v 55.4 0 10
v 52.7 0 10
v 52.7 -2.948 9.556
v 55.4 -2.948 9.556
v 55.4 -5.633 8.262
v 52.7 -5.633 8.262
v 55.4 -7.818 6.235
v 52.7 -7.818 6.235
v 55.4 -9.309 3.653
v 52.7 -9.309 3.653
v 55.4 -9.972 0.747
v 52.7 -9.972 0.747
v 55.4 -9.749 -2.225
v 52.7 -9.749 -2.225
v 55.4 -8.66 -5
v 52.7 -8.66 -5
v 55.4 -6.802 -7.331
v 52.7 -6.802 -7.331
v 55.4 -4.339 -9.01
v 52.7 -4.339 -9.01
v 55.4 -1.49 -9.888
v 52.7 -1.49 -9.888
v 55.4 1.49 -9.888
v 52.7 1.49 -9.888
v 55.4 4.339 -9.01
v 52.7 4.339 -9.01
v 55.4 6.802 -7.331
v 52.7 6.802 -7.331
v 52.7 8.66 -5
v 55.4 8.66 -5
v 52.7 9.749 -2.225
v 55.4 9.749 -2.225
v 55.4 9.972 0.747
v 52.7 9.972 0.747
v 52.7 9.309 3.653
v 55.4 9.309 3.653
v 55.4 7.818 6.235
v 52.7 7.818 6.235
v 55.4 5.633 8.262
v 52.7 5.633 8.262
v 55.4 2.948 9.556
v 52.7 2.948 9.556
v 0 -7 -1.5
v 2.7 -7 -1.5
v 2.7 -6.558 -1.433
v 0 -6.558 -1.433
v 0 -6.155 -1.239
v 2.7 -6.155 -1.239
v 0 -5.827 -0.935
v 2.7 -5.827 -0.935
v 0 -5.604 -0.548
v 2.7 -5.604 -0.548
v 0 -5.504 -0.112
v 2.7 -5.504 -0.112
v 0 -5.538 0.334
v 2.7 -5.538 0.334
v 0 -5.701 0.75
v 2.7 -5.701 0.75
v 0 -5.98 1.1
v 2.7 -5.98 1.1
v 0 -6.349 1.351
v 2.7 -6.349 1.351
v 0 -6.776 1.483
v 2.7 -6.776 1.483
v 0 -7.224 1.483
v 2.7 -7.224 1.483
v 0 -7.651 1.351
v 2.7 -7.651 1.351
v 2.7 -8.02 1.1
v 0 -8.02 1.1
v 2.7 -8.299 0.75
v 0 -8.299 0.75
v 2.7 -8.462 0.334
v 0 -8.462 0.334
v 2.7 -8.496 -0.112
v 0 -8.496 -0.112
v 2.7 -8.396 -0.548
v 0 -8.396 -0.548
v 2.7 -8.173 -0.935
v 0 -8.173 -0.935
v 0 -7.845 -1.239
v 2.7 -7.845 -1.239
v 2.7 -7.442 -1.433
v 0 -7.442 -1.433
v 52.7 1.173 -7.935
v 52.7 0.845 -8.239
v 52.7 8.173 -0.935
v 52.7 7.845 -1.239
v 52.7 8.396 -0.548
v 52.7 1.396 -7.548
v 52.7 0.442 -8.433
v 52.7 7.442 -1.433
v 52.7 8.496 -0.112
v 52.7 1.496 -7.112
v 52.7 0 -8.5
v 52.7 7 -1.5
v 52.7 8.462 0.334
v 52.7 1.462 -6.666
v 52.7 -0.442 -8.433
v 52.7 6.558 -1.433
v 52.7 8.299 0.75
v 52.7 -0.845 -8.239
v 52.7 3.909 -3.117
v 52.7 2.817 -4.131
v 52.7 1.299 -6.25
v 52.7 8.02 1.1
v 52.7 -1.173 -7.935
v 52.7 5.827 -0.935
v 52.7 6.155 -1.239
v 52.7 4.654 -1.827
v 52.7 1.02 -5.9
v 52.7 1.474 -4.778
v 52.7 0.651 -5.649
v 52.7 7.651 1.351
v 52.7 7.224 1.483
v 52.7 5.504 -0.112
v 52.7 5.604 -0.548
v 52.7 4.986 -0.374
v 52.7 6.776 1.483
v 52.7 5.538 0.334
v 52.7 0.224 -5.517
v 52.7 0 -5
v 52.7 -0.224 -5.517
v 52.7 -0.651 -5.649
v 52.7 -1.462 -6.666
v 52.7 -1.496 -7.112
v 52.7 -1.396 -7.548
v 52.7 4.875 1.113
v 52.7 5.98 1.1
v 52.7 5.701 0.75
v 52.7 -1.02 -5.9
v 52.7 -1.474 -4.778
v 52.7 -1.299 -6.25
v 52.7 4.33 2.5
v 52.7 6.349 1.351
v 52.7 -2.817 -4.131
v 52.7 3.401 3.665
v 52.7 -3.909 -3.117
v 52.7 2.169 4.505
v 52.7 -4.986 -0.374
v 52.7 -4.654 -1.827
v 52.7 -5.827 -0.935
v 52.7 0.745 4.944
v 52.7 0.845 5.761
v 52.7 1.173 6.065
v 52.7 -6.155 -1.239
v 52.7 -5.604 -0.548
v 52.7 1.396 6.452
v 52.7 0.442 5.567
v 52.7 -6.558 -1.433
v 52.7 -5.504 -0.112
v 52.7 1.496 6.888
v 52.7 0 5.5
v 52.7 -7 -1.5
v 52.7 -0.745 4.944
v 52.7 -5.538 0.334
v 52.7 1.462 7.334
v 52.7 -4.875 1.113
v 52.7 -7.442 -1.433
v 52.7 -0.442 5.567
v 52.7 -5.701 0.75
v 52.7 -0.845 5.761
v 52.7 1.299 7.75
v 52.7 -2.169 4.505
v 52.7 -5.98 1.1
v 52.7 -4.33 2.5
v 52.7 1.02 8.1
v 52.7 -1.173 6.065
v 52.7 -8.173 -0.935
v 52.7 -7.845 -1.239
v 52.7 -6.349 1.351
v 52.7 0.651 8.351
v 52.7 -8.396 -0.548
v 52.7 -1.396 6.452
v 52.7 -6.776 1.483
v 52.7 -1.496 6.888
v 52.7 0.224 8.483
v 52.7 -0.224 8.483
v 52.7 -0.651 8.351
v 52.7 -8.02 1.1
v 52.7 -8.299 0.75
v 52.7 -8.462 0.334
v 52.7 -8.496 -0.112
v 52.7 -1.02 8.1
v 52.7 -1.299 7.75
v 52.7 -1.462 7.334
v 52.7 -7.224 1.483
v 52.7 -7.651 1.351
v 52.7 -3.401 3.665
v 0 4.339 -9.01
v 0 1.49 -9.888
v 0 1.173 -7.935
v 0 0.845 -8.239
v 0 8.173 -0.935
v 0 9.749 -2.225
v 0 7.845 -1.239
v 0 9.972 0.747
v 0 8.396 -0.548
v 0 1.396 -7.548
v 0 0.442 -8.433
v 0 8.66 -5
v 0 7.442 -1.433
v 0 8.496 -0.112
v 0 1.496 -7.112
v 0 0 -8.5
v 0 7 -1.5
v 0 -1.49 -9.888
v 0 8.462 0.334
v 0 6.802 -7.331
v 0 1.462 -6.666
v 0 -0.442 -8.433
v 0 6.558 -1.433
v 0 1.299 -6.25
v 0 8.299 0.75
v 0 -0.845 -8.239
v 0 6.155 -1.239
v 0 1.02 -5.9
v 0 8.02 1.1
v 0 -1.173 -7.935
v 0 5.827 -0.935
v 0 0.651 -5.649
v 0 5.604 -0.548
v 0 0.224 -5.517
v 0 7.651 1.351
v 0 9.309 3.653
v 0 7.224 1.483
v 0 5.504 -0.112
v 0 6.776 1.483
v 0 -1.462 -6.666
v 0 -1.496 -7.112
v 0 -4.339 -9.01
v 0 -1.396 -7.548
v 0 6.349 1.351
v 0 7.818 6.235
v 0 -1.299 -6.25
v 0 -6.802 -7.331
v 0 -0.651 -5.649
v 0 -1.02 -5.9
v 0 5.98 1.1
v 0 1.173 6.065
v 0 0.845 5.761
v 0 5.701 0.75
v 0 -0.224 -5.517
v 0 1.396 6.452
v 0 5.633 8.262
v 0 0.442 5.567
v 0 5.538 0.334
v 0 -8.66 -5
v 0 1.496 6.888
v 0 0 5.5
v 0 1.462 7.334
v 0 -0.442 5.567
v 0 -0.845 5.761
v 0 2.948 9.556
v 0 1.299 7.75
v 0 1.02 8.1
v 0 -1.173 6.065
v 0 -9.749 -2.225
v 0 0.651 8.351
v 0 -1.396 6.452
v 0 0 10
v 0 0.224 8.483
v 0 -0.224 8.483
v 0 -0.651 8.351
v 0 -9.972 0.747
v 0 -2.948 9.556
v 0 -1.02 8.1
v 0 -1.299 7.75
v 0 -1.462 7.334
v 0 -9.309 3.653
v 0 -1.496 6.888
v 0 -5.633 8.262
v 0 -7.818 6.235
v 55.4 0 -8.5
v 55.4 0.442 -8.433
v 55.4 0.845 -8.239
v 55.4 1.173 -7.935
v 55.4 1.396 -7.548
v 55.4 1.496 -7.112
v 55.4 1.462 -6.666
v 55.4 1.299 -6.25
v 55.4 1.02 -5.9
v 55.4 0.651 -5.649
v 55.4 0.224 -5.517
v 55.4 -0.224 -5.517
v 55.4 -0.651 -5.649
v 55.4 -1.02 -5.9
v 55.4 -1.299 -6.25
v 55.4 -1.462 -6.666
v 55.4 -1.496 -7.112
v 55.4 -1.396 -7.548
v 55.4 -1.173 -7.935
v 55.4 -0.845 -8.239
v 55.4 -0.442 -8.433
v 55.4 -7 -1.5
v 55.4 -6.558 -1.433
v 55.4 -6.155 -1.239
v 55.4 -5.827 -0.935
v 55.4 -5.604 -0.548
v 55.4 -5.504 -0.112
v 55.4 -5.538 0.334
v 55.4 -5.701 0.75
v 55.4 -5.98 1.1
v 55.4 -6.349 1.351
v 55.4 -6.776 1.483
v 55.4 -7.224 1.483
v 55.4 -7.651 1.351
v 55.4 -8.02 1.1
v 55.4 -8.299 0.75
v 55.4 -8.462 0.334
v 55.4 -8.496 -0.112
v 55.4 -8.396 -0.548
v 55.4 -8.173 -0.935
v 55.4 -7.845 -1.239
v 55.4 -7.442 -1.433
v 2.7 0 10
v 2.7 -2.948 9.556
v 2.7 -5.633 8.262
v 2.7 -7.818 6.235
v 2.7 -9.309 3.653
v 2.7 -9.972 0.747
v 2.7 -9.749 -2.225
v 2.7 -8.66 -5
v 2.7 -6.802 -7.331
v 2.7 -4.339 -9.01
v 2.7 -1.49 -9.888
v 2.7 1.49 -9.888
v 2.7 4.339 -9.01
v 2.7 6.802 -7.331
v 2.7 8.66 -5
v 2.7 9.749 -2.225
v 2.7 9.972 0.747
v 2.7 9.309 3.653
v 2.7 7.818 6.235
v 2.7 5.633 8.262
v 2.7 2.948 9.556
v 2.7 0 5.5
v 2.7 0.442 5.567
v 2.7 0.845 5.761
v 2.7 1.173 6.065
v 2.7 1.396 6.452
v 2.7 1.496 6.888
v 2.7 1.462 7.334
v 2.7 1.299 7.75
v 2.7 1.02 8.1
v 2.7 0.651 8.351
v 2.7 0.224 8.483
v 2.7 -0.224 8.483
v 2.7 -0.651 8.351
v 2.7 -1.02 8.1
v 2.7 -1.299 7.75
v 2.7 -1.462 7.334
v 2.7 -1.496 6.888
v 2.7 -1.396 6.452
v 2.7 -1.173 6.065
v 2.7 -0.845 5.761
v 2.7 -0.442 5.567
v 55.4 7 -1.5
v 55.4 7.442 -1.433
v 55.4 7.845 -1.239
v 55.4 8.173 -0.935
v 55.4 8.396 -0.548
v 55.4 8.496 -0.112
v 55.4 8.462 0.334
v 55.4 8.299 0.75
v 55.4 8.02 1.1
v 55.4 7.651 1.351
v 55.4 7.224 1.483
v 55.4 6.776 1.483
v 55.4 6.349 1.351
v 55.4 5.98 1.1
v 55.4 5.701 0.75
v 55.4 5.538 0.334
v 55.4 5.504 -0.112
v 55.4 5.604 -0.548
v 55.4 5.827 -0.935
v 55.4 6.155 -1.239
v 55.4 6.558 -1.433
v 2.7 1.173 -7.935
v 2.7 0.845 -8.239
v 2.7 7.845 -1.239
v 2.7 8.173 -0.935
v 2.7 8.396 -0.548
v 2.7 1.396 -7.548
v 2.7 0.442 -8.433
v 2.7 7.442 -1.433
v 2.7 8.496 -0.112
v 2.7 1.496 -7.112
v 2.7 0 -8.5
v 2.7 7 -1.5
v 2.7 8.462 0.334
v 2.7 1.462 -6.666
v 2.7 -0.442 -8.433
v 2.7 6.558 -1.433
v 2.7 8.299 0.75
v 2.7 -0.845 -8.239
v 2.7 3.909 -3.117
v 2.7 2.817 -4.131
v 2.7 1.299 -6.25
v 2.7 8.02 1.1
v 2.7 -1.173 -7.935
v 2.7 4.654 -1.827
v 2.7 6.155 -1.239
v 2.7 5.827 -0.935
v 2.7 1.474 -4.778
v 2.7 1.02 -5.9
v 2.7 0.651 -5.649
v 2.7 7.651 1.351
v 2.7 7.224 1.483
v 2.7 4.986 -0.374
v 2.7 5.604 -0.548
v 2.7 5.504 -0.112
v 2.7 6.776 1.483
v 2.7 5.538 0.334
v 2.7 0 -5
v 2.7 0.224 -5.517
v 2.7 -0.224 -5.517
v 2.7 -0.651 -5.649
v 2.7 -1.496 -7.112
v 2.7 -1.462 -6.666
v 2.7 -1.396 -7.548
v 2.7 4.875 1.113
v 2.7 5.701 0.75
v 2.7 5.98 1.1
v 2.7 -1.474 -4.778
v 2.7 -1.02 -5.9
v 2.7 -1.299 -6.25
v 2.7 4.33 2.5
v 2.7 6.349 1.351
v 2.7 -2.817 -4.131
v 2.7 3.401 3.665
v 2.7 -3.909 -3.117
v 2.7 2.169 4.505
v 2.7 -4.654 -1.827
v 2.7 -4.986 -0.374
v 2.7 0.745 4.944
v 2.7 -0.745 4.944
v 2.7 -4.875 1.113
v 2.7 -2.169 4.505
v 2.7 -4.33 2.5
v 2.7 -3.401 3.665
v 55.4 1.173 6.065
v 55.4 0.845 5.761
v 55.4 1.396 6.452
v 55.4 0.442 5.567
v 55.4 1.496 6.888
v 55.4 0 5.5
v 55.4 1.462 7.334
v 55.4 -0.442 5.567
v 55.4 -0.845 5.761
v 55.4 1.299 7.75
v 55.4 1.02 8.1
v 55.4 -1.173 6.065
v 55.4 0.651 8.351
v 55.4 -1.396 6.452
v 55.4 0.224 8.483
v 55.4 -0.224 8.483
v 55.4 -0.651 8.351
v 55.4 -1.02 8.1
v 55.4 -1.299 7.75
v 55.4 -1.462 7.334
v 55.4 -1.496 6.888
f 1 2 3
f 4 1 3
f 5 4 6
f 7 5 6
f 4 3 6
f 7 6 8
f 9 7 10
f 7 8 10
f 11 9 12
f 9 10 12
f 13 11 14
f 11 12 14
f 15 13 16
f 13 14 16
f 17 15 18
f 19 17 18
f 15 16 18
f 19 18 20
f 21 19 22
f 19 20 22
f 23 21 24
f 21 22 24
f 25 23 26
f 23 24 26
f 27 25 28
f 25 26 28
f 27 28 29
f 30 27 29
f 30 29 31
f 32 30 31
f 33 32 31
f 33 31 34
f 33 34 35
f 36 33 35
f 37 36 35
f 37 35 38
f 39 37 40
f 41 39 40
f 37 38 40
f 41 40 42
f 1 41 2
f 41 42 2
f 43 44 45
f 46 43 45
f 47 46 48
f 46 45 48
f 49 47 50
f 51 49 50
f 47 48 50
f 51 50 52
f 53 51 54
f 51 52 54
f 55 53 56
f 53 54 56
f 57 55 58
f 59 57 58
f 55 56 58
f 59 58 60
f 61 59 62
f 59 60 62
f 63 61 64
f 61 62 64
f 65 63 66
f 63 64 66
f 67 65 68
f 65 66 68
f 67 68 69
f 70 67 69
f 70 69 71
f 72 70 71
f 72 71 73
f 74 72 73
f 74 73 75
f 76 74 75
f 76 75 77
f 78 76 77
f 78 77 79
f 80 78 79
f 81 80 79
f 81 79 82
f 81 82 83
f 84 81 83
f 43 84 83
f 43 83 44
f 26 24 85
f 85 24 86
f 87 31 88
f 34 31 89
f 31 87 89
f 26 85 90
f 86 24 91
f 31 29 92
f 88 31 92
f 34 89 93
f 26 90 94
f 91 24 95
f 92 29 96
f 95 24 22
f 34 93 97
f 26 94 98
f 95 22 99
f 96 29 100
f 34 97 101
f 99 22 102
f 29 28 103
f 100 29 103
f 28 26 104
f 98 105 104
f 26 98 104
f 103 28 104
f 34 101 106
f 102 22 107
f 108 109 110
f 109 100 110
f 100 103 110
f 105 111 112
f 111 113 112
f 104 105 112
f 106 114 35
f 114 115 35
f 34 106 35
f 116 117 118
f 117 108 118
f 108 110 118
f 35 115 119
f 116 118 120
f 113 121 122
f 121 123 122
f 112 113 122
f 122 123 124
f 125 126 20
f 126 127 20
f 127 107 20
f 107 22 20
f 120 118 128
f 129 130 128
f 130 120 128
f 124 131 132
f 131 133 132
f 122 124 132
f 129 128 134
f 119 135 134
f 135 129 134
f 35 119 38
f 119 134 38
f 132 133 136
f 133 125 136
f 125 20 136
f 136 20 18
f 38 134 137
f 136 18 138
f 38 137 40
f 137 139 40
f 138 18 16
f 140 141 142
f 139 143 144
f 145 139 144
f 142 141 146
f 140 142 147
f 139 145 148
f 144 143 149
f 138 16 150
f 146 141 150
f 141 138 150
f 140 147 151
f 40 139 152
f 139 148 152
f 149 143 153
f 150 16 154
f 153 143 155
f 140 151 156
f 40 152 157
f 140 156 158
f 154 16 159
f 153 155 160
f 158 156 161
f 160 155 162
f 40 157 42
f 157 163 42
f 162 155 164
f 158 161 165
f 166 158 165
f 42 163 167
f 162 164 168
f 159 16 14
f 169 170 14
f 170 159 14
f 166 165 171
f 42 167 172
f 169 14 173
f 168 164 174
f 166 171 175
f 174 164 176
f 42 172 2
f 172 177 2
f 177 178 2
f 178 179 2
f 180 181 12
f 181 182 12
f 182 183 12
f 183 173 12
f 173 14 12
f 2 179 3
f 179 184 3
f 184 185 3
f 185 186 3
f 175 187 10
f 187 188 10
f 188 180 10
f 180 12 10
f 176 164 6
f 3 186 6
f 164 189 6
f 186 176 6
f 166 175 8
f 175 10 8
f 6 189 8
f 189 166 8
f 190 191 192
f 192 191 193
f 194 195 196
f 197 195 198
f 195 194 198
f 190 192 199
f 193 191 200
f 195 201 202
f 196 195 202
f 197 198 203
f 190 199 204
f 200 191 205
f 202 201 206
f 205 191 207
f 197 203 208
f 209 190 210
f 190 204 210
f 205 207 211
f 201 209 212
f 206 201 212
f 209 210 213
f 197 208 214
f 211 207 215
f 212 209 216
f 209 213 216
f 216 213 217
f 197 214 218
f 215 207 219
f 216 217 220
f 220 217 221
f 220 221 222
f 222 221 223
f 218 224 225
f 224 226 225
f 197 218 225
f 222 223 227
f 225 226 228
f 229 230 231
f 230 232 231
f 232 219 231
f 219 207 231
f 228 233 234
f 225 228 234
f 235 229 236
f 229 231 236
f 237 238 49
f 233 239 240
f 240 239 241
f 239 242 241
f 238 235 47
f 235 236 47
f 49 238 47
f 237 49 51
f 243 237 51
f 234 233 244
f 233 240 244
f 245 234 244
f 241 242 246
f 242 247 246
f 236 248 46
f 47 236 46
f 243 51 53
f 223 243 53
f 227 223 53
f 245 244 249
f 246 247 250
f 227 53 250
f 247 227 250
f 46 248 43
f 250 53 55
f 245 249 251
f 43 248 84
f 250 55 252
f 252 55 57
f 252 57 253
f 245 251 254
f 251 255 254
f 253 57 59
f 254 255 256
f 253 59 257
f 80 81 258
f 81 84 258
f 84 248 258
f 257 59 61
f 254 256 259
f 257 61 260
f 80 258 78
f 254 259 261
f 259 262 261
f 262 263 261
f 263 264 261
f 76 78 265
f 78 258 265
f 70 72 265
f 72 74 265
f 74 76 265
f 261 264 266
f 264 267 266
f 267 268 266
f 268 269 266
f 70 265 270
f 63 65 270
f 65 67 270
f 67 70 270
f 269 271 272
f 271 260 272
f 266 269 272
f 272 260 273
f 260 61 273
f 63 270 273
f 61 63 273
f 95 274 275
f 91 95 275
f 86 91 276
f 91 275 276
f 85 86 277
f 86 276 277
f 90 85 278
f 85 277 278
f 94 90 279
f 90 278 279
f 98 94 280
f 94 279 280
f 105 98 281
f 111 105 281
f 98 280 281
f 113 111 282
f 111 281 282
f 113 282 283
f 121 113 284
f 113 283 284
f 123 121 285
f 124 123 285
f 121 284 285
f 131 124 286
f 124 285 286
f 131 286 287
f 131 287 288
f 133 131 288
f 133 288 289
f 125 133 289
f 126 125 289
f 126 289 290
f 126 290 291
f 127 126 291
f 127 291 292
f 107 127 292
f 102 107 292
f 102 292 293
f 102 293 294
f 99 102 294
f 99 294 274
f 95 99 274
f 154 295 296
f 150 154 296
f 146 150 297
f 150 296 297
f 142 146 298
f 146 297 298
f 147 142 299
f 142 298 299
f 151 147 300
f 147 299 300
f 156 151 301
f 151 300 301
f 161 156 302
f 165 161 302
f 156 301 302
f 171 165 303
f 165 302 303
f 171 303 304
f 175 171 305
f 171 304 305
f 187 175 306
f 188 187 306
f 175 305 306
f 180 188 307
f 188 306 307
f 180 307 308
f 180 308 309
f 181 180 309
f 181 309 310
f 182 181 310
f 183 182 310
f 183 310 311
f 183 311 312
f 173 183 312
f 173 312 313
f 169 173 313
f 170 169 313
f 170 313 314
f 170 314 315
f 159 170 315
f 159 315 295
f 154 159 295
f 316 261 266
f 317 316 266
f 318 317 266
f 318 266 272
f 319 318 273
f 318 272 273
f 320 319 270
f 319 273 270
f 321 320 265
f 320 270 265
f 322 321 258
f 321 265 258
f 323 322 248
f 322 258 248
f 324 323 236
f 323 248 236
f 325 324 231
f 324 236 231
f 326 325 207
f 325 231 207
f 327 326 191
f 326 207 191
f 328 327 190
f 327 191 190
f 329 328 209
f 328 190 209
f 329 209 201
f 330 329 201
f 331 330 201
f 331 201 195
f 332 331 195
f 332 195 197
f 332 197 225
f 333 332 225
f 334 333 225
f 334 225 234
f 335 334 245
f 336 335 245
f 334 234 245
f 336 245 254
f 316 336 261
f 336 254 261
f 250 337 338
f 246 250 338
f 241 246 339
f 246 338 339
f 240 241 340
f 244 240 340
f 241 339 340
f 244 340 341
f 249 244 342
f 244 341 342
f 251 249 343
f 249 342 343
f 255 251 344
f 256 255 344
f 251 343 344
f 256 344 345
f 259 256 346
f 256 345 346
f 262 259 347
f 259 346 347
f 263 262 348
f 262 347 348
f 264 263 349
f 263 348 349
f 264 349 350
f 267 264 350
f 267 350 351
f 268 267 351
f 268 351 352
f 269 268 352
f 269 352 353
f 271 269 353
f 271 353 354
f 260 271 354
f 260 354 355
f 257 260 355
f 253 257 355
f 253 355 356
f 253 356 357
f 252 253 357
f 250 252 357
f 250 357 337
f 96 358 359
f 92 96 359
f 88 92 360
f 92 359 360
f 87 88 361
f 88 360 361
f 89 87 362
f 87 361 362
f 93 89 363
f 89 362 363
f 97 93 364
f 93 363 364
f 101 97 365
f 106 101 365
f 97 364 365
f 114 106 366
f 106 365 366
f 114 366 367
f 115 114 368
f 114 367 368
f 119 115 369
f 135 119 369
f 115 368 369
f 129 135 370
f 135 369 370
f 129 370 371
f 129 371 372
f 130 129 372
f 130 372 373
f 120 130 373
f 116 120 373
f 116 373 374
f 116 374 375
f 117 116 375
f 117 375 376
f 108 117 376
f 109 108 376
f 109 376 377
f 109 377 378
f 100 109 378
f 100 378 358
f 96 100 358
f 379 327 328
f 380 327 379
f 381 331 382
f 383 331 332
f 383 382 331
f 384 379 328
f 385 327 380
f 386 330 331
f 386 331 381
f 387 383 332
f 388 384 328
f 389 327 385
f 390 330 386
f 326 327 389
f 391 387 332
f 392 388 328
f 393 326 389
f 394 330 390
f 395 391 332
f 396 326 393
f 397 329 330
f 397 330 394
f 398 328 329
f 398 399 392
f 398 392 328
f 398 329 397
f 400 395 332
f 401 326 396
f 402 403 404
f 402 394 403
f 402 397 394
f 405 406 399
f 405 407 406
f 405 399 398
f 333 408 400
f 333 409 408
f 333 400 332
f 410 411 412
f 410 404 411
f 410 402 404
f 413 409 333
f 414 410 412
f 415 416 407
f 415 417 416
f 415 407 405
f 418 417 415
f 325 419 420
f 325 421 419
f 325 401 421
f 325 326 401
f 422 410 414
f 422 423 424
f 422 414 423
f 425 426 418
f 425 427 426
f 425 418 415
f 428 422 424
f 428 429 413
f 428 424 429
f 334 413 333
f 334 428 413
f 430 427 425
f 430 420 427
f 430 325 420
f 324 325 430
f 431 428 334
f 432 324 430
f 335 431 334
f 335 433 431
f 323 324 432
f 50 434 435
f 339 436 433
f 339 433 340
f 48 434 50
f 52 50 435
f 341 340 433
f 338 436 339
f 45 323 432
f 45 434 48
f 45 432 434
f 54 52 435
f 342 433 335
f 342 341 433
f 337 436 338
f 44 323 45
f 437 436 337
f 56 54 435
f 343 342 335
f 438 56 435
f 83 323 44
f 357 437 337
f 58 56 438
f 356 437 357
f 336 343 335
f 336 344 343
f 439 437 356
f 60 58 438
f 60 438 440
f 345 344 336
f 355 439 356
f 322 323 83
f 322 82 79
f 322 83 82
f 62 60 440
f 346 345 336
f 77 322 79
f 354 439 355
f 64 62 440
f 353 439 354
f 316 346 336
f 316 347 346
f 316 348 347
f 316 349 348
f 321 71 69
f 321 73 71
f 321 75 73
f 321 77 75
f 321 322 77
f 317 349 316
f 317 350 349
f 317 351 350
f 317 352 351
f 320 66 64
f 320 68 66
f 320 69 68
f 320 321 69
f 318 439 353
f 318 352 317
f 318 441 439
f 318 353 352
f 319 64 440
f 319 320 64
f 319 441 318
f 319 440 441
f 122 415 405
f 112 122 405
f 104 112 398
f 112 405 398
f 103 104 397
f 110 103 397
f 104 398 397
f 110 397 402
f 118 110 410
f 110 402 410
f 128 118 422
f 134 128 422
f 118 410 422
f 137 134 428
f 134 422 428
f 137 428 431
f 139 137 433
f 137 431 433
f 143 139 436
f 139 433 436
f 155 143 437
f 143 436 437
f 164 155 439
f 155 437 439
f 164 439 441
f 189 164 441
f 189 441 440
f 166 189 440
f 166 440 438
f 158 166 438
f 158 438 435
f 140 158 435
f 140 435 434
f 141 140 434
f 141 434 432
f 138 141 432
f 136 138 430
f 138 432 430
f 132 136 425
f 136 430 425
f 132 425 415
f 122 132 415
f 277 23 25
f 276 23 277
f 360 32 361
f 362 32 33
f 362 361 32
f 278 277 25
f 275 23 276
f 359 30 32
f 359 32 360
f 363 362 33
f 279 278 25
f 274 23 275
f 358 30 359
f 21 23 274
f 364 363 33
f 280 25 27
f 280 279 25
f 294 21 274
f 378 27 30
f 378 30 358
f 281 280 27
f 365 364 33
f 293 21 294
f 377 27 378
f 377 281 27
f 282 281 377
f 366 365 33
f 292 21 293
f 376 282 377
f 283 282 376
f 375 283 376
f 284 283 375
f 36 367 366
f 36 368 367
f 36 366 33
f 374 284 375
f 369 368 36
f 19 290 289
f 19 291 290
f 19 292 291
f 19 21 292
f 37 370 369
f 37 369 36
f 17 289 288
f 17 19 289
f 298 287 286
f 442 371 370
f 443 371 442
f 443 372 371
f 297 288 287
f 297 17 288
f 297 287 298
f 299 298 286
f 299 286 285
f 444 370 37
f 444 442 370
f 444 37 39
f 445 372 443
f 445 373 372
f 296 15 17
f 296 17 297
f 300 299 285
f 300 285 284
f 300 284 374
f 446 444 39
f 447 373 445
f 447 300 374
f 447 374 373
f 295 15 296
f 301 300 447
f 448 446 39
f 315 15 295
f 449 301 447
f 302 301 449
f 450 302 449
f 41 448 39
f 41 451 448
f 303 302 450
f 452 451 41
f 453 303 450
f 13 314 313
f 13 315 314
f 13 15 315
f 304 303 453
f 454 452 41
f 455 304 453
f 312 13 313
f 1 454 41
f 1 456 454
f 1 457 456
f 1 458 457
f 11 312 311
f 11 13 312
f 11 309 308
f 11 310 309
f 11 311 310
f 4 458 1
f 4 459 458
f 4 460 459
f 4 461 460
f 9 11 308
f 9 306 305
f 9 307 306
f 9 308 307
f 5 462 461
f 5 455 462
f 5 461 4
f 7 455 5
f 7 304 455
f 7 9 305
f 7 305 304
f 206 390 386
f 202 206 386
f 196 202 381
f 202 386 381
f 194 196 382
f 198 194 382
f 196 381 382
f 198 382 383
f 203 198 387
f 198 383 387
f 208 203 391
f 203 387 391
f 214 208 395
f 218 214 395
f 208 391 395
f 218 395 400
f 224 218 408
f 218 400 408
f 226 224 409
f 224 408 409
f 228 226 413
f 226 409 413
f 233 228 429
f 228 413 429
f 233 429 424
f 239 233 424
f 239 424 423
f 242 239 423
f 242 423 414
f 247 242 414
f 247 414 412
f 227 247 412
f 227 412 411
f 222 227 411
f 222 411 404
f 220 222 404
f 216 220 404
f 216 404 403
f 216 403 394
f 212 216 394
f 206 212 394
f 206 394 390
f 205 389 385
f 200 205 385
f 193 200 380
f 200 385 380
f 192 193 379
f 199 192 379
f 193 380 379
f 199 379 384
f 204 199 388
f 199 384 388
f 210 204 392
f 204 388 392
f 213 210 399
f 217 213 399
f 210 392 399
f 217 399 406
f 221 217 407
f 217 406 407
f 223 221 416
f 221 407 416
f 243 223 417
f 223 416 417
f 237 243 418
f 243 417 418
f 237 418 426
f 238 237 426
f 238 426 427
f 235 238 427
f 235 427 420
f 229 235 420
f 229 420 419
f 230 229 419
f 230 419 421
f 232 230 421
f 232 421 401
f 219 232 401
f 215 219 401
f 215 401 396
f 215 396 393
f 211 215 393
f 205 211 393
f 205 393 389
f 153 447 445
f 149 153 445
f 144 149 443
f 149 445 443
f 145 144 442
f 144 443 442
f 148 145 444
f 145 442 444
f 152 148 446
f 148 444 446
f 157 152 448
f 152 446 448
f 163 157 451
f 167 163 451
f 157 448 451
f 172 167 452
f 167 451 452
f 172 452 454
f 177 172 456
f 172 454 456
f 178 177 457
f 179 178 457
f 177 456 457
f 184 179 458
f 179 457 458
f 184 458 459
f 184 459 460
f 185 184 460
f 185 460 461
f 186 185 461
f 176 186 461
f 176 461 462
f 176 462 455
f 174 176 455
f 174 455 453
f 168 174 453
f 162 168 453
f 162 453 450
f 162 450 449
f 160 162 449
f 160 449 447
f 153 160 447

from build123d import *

# Parameters (mm, degrees)
CROQUIS1_R              = 10
SALIENTE_EXTRUIR1_DEPTH = 2.7
CROQUIS2_R              = 5
SALIENTE_EXTRUIR2_DEPTH = 50
CROQUIS3_R              = 10
SALIENTE_EXTRUIR3_DEPTH = 2.7
CROQUIS5_R              = 1.5
CORTAR_EXTRUIR1_DEPTH   = 60


with BuildPart() as part:
    # Croquis1 → Saliente-Extruir1 (new body)
    with BuildSketch(Plane(origin=(0, 0, 0), x_dir=(0, 0, -1), z_dir=(1, 0, 0))):
        with Locations(Location((0, 0, 0), (0, 0, 180))):
            Circle(CROQUIS1_R)
    extrude(amount=SALIENTE_EXTRUIR1_DEPTH)

    # Croquis2 → Saliente-Extruir2 (add)
    with BuildSketch(Plane(origin=(2.7, 0, 0), x_dir=(0, 0, -1), z_dir=(1, 0, 0))):
        Circle(CROQUIS2_R)
    extrude(amount=SALIENTE_EXTRUIR2_DEPTH)

    # Croquis3 → Saliente-Extruir3 (add)
    with BuildSketch(Plane(origin=(52.7, 0, 0), x_dir=(0, 0, -1), z_dir=(1, 0, 0))):
        with Locations(Location((0, 0, 0), (0, 0, 180))):
            Circle(CROQUIS3_R)
    extrude(amount=SALIENTE_EXTRUIR3_DEPTH)

    # Croquis5 → Cortar-Extruir1 (cut)
    with BuildSketch(Plane(origin=(55.4, 0, 0), x_dir=(0, 0, -1), z_dir=(1, 0, 0))):
        with Locations((0, 7)):
            Circle(CROQUIS5_R)
        with Locations((7, 0)):
            Circle(CROQUIS5_R)
        with Locations((0, -7)):
            Circle(CROQUIS5_R)
        with Locations((-7, 0)):
            Circle(CROQUIS5_R)
    extrude(amount=-CORTAR_EXTRUIR1_DEPTH, mode=Mode.SUBTRACT)


solid = part.part
